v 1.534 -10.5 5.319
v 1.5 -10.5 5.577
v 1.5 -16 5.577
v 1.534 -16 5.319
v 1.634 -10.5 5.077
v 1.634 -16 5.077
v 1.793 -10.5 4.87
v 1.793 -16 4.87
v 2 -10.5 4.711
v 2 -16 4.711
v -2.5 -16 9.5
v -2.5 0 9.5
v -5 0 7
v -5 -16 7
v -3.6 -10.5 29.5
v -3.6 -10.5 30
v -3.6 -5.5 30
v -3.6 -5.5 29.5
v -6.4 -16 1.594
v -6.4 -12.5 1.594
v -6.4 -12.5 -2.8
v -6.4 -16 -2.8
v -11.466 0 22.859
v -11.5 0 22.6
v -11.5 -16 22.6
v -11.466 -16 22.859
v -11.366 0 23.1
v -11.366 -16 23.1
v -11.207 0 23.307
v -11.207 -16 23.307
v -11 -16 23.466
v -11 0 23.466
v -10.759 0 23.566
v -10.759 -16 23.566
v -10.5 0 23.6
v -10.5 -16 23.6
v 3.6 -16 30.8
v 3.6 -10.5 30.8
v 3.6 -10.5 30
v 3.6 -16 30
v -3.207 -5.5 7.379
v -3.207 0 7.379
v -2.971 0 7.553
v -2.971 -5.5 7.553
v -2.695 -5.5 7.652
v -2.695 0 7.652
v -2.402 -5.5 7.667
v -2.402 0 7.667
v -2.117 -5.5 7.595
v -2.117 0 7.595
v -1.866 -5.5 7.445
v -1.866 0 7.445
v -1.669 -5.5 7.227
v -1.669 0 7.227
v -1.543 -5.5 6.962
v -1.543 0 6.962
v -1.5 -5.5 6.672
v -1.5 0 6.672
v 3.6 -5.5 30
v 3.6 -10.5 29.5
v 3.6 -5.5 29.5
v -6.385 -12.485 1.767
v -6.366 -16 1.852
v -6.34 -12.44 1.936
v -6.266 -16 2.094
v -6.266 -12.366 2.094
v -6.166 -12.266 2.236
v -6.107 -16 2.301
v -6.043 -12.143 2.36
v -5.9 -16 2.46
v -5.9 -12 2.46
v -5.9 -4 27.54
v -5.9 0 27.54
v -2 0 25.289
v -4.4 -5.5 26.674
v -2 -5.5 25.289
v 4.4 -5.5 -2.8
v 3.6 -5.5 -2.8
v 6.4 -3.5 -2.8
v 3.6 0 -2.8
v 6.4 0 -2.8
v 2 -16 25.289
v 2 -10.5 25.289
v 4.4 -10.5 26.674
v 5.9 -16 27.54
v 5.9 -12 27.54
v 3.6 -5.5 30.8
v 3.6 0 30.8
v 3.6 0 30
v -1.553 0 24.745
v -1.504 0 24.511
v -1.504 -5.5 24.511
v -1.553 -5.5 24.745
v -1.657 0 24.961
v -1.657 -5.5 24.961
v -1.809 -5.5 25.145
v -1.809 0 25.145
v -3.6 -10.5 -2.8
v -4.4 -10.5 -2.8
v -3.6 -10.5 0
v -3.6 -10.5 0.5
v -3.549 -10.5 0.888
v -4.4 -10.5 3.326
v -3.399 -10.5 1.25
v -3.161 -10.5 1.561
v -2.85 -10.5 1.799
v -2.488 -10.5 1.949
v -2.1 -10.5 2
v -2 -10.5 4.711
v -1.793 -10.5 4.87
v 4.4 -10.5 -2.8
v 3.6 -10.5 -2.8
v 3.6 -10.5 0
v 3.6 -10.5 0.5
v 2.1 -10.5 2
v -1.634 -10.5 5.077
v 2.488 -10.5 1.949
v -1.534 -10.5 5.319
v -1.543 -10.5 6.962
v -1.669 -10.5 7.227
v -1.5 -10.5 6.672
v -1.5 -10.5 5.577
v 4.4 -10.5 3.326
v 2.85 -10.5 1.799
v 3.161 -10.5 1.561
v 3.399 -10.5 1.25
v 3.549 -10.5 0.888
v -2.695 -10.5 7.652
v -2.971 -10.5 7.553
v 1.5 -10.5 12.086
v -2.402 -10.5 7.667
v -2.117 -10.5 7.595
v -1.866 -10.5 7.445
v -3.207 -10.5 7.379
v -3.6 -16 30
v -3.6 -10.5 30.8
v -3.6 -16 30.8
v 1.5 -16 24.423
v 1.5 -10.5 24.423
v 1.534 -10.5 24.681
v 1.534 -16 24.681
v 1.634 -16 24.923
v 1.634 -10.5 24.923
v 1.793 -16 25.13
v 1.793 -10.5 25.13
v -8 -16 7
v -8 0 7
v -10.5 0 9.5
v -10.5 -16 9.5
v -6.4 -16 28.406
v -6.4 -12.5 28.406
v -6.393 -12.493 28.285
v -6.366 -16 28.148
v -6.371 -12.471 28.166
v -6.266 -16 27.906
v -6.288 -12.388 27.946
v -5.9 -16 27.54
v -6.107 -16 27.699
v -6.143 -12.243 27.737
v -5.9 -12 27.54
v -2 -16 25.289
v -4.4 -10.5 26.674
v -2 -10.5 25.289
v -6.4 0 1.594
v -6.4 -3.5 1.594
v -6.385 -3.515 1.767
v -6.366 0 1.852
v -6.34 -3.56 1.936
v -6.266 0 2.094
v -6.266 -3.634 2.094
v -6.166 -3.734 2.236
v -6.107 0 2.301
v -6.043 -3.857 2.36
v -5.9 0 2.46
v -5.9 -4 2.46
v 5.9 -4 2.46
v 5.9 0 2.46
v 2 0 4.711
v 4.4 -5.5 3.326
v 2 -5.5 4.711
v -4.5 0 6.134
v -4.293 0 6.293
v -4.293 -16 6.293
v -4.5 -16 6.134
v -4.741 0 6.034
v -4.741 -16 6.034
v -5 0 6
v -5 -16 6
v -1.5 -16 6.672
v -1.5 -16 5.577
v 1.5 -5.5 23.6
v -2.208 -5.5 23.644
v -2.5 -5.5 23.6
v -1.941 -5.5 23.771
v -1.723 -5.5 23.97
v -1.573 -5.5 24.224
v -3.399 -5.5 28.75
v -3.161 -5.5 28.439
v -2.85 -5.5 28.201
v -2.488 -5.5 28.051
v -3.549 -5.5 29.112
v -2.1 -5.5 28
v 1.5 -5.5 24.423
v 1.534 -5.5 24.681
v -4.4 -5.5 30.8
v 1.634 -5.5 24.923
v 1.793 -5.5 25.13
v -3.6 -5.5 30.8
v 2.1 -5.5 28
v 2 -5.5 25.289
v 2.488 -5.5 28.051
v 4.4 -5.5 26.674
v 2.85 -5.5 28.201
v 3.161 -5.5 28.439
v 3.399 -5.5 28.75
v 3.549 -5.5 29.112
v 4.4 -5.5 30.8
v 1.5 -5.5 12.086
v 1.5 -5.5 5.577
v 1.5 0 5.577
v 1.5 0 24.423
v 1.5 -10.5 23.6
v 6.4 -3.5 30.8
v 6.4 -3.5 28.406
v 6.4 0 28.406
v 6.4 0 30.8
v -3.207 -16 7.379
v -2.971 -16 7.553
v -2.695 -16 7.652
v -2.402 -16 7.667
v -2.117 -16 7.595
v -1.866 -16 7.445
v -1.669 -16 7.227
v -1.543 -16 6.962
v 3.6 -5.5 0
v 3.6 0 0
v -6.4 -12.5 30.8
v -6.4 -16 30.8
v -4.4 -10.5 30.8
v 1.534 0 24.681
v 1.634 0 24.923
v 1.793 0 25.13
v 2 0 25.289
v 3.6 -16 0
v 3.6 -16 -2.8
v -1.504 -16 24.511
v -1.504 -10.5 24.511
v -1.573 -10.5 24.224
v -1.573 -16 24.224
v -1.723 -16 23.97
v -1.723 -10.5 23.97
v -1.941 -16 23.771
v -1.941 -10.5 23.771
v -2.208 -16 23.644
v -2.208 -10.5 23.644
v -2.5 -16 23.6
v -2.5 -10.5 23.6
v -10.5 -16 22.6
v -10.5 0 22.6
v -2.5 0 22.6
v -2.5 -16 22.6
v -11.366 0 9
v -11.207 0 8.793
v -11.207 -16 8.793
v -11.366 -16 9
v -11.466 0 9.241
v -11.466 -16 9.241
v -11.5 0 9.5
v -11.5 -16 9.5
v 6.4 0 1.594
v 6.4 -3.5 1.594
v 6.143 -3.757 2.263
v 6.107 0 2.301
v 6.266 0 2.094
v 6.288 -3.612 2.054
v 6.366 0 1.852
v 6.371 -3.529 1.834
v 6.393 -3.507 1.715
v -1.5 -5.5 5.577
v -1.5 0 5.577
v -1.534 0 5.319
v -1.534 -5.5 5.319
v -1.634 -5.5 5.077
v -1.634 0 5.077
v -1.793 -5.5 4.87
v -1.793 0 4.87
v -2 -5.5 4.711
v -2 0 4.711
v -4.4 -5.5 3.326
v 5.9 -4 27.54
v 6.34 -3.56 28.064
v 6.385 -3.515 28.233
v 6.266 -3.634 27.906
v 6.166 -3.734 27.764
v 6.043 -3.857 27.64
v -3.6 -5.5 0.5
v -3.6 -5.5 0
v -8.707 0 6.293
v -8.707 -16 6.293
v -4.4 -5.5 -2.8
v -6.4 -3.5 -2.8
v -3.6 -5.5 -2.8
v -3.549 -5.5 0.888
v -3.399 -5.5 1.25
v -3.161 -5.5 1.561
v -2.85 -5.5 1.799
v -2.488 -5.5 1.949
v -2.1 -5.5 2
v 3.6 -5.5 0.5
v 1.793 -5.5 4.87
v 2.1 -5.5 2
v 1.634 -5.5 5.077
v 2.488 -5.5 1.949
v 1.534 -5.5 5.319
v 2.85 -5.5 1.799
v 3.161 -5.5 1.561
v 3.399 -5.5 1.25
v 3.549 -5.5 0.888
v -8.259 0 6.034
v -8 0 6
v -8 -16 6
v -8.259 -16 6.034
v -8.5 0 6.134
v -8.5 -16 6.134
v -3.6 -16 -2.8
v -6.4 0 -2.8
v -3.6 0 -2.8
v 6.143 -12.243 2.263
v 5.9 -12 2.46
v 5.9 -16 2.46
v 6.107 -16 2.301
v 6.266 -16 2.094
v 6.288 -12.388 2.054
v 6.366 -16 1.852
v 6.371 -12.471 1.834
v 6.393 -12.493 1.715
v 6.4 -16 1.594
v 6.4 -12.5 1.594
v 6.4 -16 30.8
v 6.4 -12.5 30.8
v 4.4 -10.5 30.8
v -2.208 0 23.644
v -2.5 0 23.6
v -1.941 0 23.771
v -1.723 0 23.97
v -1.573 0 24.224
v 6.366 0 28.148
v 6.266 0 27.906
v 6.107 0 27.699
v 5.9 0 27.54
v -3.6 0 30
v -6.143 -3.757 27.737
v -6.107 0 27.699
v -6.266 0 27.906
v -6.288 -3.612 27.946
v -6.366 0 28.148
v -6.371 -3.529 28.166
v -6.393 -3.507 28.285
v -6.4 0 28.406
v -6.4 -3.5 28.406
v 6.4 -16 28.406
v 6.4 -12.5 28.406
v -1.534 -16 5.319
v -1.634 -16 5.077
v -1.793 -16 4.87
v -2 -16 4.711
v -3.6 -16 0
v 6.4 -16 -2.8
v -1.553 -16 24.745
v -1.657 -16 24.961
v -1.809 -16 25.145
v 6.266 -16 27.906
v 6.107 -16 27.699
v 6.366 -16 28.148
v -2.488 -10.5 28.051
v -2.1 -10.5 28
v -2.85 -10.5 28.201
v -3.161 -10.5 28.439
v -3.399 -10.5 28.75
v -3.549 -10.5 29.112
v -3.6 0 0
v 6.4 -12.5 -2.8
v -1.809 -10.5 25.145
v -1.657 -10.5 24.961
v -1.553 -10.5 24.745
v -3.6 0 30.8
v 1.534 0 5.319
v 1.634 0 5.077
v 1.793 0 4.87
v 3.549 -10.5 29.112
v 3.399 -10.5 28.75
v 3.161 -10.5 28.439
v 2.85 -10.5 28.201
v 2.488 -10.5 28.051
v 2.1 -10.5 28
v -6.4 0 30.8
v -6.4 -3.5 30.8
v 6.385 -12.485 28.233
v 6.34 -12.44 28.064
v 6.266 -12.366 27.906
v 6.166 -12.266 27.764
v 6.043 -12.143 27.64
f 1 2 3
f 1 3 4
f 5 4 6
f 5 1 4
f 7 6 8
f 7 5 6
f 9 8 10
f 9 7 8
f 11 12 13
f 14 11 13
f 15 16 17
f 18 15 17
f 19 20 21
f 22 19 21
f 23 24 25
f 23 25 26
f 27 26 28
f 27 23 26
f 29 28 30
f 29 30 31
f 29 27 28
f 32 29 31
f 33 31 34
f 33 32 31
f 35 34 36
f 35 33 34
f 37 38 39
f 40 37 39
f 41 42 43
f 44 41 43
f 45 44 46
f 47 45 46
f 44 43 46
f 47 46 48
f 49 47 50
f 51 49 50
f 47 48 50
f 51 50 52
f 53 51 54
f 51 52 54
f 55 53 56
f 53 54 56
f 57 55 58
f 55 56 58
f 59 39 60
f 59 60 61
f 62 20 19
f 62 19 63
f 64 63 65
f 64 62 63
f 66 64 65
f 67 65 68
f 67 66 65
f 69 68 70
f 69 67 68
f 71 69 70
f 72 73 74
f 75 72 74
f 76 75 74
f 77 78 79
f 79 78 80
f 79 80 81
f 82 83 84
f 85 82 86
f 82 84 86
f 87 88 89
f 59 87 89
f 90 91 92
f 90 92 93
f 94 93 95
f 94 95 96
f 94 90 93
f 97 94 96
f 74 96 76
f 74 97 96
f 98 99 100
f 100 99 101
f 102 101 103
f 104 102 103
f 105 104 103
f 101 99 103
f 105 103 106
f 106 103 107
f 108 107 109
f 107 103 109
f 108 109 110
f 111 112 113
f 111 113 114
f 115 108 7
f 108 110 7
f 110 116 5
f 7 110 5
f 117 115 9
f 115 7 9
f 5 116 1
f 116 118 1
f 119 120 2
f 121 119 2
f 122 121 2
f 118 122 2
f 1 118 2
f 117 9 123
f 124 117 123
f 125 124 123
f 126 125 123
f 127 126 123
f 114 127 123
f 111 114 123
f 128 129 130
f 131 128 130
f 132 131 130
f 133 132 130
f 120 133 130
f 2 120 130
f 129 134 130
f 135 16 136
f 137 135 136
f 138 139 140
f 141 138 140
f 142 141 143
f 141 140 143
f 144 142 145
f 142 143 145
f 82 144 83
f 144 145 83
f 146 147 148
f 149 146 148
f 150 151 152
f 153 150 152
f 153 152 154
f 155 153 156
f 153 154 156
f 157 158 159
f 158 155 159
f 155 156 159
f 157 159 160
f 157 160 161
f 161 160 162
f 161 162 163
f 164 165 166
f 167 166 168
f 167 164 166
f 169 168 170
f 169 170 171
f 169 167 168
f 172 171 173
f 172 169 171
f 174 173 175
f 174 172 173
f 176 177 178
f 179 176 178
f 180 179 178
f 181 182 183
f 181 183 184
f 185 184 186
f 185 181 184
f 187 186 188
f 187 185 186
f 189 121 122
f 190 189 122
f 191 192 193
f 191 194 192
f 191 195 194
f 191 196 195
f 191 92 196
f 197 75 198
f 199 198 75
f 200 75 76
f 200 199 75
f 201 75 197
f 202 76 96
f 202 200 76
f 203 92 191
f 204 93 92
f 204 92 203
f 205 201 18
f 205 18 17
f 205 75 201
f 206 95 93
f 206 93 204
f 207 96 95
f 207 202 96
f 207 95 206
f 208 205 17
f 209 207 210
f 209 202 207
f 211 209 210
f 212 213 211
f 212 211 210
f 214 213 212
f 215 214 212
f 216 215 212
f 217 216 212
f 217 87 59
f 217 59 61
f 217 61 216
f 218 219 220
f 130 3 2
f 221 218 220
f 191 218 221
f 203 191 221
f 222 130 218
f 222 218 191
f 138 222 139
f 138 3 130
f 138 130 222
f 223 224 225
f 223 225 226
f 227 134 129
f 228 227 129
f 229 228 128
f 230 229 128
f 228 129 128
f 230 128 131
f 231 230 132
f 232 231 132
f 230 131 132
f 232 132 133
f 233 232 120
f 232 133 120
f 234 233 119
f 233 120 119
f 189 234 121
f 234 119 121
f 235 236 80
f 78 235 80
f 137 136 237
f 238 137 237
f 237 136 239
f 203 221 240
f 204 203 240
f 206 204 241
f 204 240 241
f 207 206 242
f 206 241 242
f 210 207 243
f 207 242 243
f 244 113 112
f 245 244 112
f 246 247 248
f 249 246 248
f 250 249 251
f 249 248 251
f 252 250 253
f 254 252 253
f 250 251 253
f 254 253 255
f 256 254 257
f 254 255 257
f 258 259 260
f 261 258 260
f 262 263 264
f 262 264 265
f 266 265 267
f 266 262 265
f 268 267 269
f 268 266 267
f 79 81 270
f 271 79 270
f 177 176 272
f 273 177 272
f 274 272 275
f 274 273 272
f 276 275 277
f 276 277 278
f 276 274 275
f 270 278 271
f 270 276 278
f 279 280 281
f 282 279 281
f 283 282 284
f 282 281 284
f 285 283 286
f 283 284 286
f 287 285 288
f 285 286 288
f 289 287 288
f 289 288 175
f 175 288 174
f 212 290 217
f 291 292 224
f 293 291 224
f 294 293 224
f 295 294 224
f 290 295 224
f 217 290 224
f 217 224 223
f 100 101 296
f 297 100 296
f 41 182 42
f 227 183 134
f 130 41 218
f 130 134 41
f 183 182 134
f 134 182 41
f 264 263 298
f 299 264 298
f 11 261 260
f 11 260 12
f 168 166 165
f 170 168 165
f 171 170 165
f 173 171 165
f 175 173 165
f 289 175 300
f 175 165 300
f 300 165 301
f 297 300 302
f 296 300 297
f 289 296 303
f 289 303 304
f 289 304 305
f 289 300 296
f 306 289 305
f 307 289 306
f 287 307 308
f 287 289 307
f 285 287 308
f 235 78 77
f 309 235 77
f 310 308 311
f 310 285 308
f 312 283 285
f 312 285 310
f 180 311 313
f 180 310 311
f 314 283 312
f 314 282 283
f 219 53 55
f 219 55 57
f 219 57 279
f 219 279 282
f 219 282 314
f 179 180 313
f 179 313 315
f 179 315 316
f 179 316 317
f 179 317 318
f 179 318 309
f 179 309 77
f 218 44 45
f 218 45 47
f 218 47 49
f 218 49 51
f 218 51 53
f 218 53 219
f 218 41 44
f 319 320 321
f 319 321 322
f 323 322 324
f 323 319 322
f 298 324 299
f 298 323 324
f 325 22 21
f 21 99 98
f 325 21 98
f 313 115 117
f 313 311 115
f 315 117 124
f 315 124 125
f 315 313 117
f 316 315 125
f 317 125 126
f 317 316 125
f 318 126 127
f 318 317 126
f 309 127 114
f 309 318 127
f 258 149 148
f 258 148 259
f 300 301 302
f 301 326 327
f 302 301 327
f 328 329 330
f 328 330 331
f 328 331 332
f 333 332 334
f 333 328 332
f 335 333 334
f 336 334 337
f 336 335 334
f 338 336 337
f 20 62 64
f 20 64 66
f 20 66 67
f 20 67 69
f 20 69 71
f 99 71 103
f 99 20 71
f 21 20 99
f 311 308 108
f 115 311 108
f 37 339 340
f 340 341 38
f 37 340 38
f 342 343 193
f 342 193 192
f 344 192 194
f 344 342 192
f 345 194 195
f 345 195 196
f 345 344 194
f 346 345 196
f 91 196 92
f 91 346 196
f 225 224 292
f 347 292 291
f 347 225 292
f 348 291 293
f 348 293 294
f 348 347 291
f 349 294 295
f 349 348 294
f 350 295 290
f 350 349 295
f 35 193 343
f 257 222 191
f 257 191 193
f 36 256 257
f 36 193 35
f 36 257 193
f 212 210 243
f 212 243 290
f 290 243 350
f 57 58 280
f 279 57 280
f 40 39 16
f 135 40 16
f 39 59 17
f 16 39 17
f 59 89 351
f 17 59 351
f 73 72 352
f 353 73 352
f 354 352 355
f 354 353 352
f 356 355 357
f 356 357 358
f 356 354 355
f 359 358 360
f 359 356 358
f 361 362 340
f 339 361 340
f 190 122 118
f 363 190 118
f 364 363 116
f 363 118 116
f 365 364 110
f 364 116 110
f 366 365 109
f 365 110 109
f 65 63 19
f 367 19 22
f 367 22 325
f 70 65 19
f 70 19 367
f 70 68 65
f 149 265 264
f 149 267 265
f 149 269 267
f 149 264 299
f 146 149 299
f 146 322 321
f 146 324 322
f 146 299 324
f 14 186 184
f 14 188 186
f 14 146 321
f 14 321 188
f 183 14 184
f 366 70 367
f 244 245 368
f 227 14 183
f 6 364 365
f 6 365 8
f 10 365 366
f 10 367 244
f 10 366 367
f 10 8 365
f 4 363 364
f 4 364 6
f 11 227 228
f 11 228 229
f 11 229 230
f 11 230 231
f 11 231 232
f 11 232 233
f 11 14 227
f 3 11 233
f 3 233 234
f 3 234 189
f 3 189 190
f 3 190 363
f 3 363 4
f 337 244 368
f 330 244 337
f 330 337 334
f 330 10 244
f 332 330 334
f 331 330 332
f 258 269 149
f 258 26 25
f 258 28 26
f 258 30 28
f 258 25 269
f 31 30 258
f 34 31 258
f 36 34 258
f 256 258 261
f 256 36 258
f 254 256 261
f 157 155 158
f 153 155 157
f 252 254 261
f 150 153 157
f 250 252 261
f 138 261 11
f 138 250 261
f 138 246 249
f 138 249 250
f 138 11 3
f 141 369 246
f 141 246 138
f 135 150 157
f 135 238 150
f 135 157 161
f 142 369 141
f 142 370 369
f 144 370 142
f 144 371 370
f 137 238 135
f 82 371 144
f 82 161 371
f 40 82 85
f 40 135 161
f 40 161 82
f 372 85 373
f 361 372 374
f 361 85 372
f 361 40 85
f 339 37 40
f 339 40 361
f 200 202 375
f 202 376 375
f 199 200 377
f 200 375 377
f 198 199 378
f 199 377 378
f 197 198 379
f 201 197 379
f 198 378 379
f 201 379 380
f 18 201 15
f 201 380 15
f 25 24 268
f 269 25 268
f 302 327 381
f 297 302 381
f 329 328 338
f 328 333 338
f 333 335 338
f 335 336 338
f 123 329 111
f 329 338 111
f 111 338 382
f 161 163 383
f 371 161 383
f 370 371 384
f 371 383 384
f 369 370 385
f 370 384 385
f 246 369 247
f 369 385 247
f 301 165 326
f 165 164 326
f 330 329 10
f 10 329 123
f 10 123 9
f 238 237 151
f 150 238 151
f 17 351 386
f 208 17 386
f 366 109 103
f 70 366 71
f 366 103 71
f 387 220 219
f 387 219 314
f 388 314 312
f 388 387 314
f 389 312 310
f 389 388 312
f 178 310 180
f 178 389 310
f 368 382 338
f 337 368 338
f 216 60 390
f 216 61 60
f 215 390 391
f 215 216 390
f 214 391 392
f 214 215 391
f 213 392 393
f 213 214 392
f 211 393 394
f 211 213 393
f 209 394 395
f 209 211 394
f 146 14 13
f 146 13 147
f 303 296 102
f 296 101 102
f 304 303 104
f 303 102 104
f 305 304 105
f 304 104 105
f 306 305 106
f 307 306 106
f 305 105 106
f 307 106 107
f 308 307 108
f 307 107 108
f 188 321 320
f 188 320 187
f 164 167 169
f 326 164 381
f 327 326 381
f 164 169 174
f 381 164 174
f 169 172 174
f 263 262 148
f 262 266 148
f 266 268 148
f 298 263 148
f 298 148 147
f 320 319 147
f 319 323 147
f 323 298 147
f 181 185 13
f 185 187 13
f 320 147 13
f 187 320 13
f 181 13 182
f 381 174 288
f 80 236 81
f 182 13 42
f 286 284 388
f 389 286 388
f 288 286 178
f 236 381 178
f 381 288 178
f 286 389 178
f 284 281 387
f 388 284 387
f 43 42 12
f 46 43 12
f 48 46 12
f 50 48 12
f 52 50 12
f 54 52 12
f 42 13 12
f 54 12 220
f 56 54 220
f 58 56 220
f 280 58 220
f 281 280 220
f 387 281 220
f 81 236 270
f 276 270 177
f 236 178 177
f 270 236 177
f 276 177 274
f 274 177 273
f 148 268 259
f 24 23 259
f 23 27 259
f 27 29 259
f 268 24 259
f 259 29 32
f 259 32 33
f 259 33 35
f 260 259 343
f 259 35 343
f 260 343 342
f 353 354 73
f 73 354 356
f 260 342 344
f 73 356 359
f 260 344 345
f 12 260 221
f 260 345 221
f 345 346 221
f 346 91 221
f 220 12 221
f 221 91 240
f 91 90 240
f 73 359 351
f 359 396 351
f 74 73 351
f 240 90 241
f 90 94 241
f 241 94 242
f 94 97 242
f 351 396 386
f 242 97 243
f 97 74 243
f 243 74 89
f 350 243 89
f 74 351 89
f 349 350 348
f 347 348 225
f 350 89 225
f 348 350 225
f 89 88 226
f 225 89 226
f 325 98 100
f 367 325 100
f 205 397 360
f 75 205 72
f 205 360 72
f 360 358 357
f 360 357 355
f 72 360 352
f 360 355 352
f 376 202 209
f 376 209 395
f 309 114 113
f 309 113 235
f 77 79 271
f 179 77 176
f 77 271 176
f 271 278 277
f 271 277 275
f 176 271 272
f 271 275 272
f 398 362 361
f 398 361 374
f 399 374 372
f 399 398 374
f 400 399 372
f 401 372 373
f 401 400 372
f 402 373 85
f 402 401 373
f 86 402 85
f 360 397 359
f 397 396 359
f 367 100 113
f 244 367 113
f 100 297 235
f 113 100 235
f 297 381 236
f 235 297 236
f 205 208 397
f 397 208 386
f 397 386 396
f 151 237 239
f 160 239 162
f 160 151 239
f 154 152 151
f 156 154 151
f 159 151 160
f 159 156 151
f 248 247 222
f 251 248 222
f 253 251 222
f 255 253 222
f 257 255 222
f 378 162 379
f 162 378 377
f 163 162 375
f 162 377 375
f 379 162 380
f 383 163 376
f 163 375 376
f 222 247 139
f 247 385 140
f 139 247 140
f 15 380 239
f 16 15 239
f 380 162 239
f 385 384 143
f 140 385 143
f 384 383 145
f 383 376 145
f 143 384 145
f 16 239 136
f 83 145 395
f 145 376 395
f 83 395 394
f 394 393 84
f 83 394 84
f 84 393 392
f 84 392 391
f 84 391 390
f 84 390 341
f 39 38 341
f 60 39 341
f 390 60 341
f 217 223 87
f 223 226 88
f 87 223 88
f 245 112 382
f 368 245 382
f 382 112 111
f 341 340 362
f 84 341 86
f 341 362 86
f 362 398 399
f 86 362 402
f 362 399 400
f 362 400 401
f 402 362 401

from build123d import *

# Parameters (mm, degrees)
F1_DEPTH      = 16
F2_W          = 2.8
F2_H          = 5
F3_DEPTH      = 33.601
F4_W          = 5
F4_H          = 26
F5_DEPTH      = 10.001
F7_DEPTH      = 16
F8_R          = 1.5
F9_SIZE       = 2
F10_T1_DEPTH  = 5.5
F10_T3_DEPTH  = 5.5
F10_T8_DEPTH  = 11.5355339059
F10_T13_DEPTH = 11.5355339059
F10_T15_DEPTH = 21
F10_T17_DEPTH = 18.0710678119
F10_T19_DEPTH = 6.3867513459
F10_T21_DEPTH = 6.3867513459


# Not quite as in the source:
# - a fillet or chamfer that OpenCascade refuses, or shapes differently, is made with other operations: its cross-section is extruded or revolved along the edge and cut away or added


with BuildPart() as f1:
    # F0 (on Front) → F1 (new body)
    with BuildSketch(Plane.XZ):
        Polygon((-3.6, 30.8), (-6.4, 30.8), (-6.4, 27.829016319), (-1.5, 25), (-1.5, 5), (-6.4, 2.170983681), (-6.4, -2.8), (-3.6, -2.8), (-3.6, 0), (3.6, 0), (3.6, -2.8), (6.4, -2.8), (6.4, 2.170983681), (1.5, 5), (1.5, 25), (6.4, 27.829016319), (6.4, 30.8), (3.6, 30.8), (3.6, 30), (-3.6, 30), align=None)
    extrude(amount=F1_DEPTH)

    # F2 (on face) → F3 (cut, through all)
    with BuildSketch(Plane.XY.offset(30.8)):
        with Locations((-5, -8)):
            Rectangle(F2_W, F2_H)
        with Locations((5, -8)):
            Rectangle(F2_W, F2_H)
    extrude(amount=-F3_DEPTH, mode=Mode.SUBTRACT)

    # F4 (on face) → F5 (cut, through all)
    with BuildSketch(Plane(origin=(-3.6, 0, 0), x_dir=(0, -1, 0), z_dir=(-1, 0, 0))):
        with Locations((8, 15)):
            Rectangle(F4_W, F4_H)
    extrude(amount=-F5_DEPTH, mode=Mode.SUBTRACT)

    # F6 (on face) → F7 (join, through all)
    with BuildSketch(Plane.XZ.offset(16)):
        Polygon((-8.4142135624, 6), (-4.5857864376, 6), (1.5, 12.0857864376), (1.5, 23.6), (-11.5, 23.6), (-11.5, 9.0857864376), align=None)
        Polygon((-10.5, 9.5), (-10.5, 22.6), (-2.5, 22.6), (-2.5, 9.5), (-5, 7), (-8, 7), align=None, mode=Mode.SUBTRACT)
    extrude(amount=-F7_DEPTH)

    # F8
    f8_edges = [f1.edges().sort_by_distance(p)[0] for p in [
        (3.6, -8, 2),
        (3.6, -8, 28),
        (-3.6, -8, 28),
        (-3.6, -8, 2),
    ]]
    fillet(f8_edges, radius=F8_R)

    # F9
    f9_edges = [f1.edges().sort_by_distance(p)[0] for p in [
        (6.4, -10.5, -0.314508),
        (6.4, -5.5, -0.314508),
        (6.4, -10.5, 29.314508),
        (6.4, -5.5, 29.314508),
        (-6.4, -5.5, -0.314508),
        (-6.4, -10.5, -0.314508),
        (-6.4, -5.5, 29.314508),
        (-6.4, -10.5, 29.314508),
    ]]
    chamfer(f9_edges, length=F9_SIZE)

    # F10: fillet of radius 1 on 24 edges, made by hand

    # F10_s2 → F10_t1 (join)
    with BuildSketch(Plane.XZ.offset(10.5)):
        with BuildLine():
            ThreePointArc((-3.2071067812, 7.3786796564), (-2.1173165676, 7.5954524078), (-1.5, 6.6715728753))
            Line((-1.5, 6.6715728753), (-1.5, 9.0857864376))
            Line((-1.5, 9.0857864376), (-3.2071067812, 7.3786796564))
        make_face()
        with BuildLine():
            ThreePointArc((-1.5, 24.6), (-1.7928932188, 23.8928932188), (-2.5, 23.6))
            Line((-2.5, 23.6), (-1.5, 23.6))
            Line((-1.5, 23.6), (-1.5, 24.6))
        make_face()
        with BuildLine():
            ThreePointArc((1.5, 5.5773502692), (1.6339745962, 5.0773502692), (2, 4.7113248654))
            Line((2, 4.7113248654), (1.5, 5))
            Line((1.5, 5), (1.5, 5.5773502692))
        make_face()
        with BuildLine():
            ThreePointArc((1.5, 24.4226497308), (1.6339745962, 24.9226497308), (2, 25.2886751346))
            Line((2, 25.2886751346), (1.5, 25))
            Line((1.5, 25), (1.5, 24.4226497308))
        make_face()
        with BuildLine():
            ThreePointArc((-1.5, 5.5773502692), (-1.6339745962, 5.0773502692), (-2, 4.7113248654))
            Line((-2, 4.7113248654), (-1.5, 5))
            Line((-1.5, 5), (-1.5, 5.5773502692))
        make_face()
        with BuildLine():
            ThreePointArc((-2, 25.2886751346), (-1.6339745962, 24.9226497308), (-1.5, 24.4226497308))
            Line((-1.5, 24.4226497308), (-1.5, 25))
            Line((-1.5, 25), (-2, 25.2886751346))
        make_face()
    extrude(amount=F10_T1_DEPTH)

    # F10_s4 → F10_t3 (join)
    with BuildSketch(Plane.XZ):
        with BuildLine():
            ThreePointArc((-3.2071067812, 7.3786796564), (-2.1173165676, 7.5954524078), (-1.5, 6.6715728753))
            Line((-1.5, 6.6715728753), (-1.5, 9.0857864376))
            Line((-1.5, 9.0857864376), (-3.2071067812, 7.3786796564))
        make_face()
        with BuildLine():
            ThreePointArc((-2.5, 23.6), (-1.7928932188, 23.8928932188), (-1.5, 24.6))
            Line((-1.5, 24.6), (-1.5, 23.6))
            Line((-1.5, 23.6), (-2.5, 23.6))
        make_face()
        with BuildLine():
            ThreePointArc((1.5, 5.5773502692), (1.6339745962, 5.0773502692), (2, 4.7113248654))
            Line((2, 4.7113248654), (1.5, 5))
            Line((1.5, 5), (1.5, 5.5773502692))
        make_face()
        with BuildLine():
            ThreePointArc((1.5, 24.4226497308), (1.6339745962, 24.9226497308), (2, 25.2886751346))
            Line((2, 25.2886751346), (1.5, 25))
            Line((1.5, 25), (1.5, 24.4226497308))
        make_face()
        with BuildLine():
            ThreePointArc((-1.5, 5.5773502692), (-1.6339745962, 5.0773502692), (-2, 4.7113248654))
            Line((-2, 4.7113248654), (-1.5, 5))
            Line((-1.5, 5), (-1.5, 5.5773502692))
        make_face()
        with BuildLine():
            ThreePointArc((-1.5, 24.4226497308), (-1.6339745962, 24.9226497308), (-2, 25.2886751346))
            Line((-2, 25.2886751346), (-1.5, 25))
            Line((-1.5, 25), (-1.5, 24.4226497308))
        make_face()
    extrude(amount=F10_T3_DEPTH)


with BuildPart() as f10_tool6:
    # F10_s7 → F10_t8 (new body)
    with BuildSketch(Plane.XZ.offset(16)):
        with BuildLine():
            ThreePointArc((-3.2071067812, 7.3786796564), (-2.1173165676, 7.5954524078), (-1.5, 6.6715728753))
            Line((-1.5, 6.6715728753), (-1.5, 9.0857864376))
            Line((-1.5, 9.0857864376), (-3.2071067812, 7.3786796564))
        make_face()
    extrude(amount=-F10_T8_DEPTH)

    split(bisect_by=Plane.XZ.offset(5.5), keep=Keep.BOTTOM)


with BuildPart() as f1_1:
    add(f1.part)

    # F10_t5: union F10_tool6
    add(f10_tool6.part)


with BuildPart() as f10_tool11:
    # F10_s12 → F10_t13 (new body)
    with BuildSketch(Plane.XZ.offset(11.5355339059)):
        with BuildLine():
            ThreePointArc((-3.2071067812, 7.3786796564), (-2.1173165676, 7.5954524078), (-1.5, 6.6715728753))
            Line((-1.5, 6.6715728753), (-1.5, 9.0857864376))
            Line((-1.5, 9.0857864376), (-3.2071067812, 7.3786796564))
        make_face()
    extrude(amount=-F10_T13_DEPTH)

    split(bisect_by=Plane.XZ.offset(10.5), keep=Keep.TOP)


with BuildPart() as f1_2:
    add(f1_1.part)

    # F10_t10: union F10_tool11
    add(f10_tool11.part)

    # F10_s16 → F10_t15 (cut)
    with BuildSketch(Plane.XZ.offset(-2.5)):
        with BuildLine():
            ThreePointArc((-11.5, 22.6), (-11.2071067812, 23.3071067812), (-10.5, 23.6))
            Line((-10.5, 23.6), (-11.5, 23.6))
            Line((-11.5, 23.6), (-11.5, 22.6))
        make_face()
    extrude(amount=F10_T15_DEPTH, mode=Mode.SUBTRACT)

    # F10_s18 → F10_t17 (cut)
    with BuildSketch(Plane.XZ.offset(-1.0355339059)):
        with BuildLine():
            ThreePointArc((-11.2071067812, 8.7928932188), (-11.4238795325, 9.1173165676), (-11.5, 9.5))
            Line((-11.5, 9.5), (-11.5, 9.0857864376))
            Line((-11.5, 9.0857864376), (-11.2071067812, 8.7928932188))
        make_face()
        with BuildLine():
            ThreePointArc((-8, 6), (-8.3826834324, 6.0761204675), (-8.7071067812, 6.2928932188))
            Line((-8.7071067812, 6.2928932188), (-8.4142135624, 6))
            Line((-8.4142135624, 6), (-8, 6))
        make_face()
        with BuildLine():
            ThreePointArc((-4.2928932188, 6.2928932188), (-4.6173165676, 6.0761204675), (-5, 6))
            Line((-5, 6), (-4.5857864376, 6))
            Line((-4.5857864376, 6), (-4.2928932188, 6.2928932188))
        make_face()
    extrude(amount=F10_T17_DEPTH, mode=Mode.SUBTRACT)

    # F10_s20 → F10_t19 (cut)
    with BuildSketch(Plane.XZ.offset(11.056624327)):
        with BuildLine():
            ThreePointArc((-6.4, 1.5936334118), (-6.2660254038, 2.0936334118), (-5.9, 2.4596588156))
            Line((-5.9, 2.4596588156), (-6.4, 2.170983681))
            Line((-6.4, 2.170983681), (-6.4, 1.5936334118))
        make_face()
        with BuildLine():
            ThreePointArc((-6.4, 28.4063665882), (-6.2660254038, 27.9063665882), (-5.9, 27.5403411844))
            Line((-5.9, 27.5403411844), (-6.4, 27.829016319))
            Line((-6.4, 27.829016319), (-6.4, 28.4063665882))
        make_face()
        with BuildLine():
            ThreePointArc((6.4, 28.4063665882), (6.2660254038, 27.9063665882), (5.9, 27.5403411844))
            Line((5.9, 27.5403411844), (6.4, 27.829016319))
            Line((6.4, 27.829016319), (6.4, 28.4063665882))
        make_face()
        with BuildLine():
            ThreePointArc((5.9, 2.4596588156), (6.2660254038, 2.0936334118), (6.4, 1.5936334118))
            Line((6.4, 1.5936334118), (6.4, 2.170983681))
            Line((6.4, 2.170983681), (5.9, 2.4596588156))
        make_face()
    extrude(amount=F10_T19_DEPTH, mode=Mode.SUBTRACT)

    # F10_s22 → F10_t21 (cut)
    with BuildSketch(Plane.XZ.offset(-1.443375673)):
        with BuildLine():
            ThreePointArc((-6.4, 1.5936334118), (-6.2660254038, 2.0936334118), (-5.9, 2.4596588156))
            Line((-5.9, 2.4596588156), (-6.4, 2.170983681))
            Line((-6.4, 2.170983681), (-6.4, 1.5936334118))
        make_face()
        with BuildLine():
            ThreePointArc((-5.9, 27.5403411844), (-6.2660254038, 27.9063665882), (-6.4, 28.4063665882))
            Line((-6.4, 28.4063665882), (-6.4, 27.829016319))
            Line((-6.4, 27.829016319), (-5.9, 27.5403411844))
        make_face()
        with BuildLine():
            ThreePointArc((6.4, 28.4063665882), (6.2660254038, 27.9063665882), (5.9, 27.5403411844))
            Line((5.9, 27.5403411844), (6.4, 27.829016319))
            Line((6.4, 27.829016319), (6.4, 28.4063665882))
        make_face()
        with BuildLine():
            ThreePointArc((5.9, 2.4596588156), (6.2660254038, 2.0936334118), (6.4, 1.5936334118))
            Line((6.4, 1.5936334118), (6.4, 2.170983681))
            Line((6.4, 2.170983681), (5.9, 2.4596588156))
        make_face()
    extrude(amount=F10_T21_DEPTH, mode=Mode.SUBTRACT)


solid = f1_2.part
